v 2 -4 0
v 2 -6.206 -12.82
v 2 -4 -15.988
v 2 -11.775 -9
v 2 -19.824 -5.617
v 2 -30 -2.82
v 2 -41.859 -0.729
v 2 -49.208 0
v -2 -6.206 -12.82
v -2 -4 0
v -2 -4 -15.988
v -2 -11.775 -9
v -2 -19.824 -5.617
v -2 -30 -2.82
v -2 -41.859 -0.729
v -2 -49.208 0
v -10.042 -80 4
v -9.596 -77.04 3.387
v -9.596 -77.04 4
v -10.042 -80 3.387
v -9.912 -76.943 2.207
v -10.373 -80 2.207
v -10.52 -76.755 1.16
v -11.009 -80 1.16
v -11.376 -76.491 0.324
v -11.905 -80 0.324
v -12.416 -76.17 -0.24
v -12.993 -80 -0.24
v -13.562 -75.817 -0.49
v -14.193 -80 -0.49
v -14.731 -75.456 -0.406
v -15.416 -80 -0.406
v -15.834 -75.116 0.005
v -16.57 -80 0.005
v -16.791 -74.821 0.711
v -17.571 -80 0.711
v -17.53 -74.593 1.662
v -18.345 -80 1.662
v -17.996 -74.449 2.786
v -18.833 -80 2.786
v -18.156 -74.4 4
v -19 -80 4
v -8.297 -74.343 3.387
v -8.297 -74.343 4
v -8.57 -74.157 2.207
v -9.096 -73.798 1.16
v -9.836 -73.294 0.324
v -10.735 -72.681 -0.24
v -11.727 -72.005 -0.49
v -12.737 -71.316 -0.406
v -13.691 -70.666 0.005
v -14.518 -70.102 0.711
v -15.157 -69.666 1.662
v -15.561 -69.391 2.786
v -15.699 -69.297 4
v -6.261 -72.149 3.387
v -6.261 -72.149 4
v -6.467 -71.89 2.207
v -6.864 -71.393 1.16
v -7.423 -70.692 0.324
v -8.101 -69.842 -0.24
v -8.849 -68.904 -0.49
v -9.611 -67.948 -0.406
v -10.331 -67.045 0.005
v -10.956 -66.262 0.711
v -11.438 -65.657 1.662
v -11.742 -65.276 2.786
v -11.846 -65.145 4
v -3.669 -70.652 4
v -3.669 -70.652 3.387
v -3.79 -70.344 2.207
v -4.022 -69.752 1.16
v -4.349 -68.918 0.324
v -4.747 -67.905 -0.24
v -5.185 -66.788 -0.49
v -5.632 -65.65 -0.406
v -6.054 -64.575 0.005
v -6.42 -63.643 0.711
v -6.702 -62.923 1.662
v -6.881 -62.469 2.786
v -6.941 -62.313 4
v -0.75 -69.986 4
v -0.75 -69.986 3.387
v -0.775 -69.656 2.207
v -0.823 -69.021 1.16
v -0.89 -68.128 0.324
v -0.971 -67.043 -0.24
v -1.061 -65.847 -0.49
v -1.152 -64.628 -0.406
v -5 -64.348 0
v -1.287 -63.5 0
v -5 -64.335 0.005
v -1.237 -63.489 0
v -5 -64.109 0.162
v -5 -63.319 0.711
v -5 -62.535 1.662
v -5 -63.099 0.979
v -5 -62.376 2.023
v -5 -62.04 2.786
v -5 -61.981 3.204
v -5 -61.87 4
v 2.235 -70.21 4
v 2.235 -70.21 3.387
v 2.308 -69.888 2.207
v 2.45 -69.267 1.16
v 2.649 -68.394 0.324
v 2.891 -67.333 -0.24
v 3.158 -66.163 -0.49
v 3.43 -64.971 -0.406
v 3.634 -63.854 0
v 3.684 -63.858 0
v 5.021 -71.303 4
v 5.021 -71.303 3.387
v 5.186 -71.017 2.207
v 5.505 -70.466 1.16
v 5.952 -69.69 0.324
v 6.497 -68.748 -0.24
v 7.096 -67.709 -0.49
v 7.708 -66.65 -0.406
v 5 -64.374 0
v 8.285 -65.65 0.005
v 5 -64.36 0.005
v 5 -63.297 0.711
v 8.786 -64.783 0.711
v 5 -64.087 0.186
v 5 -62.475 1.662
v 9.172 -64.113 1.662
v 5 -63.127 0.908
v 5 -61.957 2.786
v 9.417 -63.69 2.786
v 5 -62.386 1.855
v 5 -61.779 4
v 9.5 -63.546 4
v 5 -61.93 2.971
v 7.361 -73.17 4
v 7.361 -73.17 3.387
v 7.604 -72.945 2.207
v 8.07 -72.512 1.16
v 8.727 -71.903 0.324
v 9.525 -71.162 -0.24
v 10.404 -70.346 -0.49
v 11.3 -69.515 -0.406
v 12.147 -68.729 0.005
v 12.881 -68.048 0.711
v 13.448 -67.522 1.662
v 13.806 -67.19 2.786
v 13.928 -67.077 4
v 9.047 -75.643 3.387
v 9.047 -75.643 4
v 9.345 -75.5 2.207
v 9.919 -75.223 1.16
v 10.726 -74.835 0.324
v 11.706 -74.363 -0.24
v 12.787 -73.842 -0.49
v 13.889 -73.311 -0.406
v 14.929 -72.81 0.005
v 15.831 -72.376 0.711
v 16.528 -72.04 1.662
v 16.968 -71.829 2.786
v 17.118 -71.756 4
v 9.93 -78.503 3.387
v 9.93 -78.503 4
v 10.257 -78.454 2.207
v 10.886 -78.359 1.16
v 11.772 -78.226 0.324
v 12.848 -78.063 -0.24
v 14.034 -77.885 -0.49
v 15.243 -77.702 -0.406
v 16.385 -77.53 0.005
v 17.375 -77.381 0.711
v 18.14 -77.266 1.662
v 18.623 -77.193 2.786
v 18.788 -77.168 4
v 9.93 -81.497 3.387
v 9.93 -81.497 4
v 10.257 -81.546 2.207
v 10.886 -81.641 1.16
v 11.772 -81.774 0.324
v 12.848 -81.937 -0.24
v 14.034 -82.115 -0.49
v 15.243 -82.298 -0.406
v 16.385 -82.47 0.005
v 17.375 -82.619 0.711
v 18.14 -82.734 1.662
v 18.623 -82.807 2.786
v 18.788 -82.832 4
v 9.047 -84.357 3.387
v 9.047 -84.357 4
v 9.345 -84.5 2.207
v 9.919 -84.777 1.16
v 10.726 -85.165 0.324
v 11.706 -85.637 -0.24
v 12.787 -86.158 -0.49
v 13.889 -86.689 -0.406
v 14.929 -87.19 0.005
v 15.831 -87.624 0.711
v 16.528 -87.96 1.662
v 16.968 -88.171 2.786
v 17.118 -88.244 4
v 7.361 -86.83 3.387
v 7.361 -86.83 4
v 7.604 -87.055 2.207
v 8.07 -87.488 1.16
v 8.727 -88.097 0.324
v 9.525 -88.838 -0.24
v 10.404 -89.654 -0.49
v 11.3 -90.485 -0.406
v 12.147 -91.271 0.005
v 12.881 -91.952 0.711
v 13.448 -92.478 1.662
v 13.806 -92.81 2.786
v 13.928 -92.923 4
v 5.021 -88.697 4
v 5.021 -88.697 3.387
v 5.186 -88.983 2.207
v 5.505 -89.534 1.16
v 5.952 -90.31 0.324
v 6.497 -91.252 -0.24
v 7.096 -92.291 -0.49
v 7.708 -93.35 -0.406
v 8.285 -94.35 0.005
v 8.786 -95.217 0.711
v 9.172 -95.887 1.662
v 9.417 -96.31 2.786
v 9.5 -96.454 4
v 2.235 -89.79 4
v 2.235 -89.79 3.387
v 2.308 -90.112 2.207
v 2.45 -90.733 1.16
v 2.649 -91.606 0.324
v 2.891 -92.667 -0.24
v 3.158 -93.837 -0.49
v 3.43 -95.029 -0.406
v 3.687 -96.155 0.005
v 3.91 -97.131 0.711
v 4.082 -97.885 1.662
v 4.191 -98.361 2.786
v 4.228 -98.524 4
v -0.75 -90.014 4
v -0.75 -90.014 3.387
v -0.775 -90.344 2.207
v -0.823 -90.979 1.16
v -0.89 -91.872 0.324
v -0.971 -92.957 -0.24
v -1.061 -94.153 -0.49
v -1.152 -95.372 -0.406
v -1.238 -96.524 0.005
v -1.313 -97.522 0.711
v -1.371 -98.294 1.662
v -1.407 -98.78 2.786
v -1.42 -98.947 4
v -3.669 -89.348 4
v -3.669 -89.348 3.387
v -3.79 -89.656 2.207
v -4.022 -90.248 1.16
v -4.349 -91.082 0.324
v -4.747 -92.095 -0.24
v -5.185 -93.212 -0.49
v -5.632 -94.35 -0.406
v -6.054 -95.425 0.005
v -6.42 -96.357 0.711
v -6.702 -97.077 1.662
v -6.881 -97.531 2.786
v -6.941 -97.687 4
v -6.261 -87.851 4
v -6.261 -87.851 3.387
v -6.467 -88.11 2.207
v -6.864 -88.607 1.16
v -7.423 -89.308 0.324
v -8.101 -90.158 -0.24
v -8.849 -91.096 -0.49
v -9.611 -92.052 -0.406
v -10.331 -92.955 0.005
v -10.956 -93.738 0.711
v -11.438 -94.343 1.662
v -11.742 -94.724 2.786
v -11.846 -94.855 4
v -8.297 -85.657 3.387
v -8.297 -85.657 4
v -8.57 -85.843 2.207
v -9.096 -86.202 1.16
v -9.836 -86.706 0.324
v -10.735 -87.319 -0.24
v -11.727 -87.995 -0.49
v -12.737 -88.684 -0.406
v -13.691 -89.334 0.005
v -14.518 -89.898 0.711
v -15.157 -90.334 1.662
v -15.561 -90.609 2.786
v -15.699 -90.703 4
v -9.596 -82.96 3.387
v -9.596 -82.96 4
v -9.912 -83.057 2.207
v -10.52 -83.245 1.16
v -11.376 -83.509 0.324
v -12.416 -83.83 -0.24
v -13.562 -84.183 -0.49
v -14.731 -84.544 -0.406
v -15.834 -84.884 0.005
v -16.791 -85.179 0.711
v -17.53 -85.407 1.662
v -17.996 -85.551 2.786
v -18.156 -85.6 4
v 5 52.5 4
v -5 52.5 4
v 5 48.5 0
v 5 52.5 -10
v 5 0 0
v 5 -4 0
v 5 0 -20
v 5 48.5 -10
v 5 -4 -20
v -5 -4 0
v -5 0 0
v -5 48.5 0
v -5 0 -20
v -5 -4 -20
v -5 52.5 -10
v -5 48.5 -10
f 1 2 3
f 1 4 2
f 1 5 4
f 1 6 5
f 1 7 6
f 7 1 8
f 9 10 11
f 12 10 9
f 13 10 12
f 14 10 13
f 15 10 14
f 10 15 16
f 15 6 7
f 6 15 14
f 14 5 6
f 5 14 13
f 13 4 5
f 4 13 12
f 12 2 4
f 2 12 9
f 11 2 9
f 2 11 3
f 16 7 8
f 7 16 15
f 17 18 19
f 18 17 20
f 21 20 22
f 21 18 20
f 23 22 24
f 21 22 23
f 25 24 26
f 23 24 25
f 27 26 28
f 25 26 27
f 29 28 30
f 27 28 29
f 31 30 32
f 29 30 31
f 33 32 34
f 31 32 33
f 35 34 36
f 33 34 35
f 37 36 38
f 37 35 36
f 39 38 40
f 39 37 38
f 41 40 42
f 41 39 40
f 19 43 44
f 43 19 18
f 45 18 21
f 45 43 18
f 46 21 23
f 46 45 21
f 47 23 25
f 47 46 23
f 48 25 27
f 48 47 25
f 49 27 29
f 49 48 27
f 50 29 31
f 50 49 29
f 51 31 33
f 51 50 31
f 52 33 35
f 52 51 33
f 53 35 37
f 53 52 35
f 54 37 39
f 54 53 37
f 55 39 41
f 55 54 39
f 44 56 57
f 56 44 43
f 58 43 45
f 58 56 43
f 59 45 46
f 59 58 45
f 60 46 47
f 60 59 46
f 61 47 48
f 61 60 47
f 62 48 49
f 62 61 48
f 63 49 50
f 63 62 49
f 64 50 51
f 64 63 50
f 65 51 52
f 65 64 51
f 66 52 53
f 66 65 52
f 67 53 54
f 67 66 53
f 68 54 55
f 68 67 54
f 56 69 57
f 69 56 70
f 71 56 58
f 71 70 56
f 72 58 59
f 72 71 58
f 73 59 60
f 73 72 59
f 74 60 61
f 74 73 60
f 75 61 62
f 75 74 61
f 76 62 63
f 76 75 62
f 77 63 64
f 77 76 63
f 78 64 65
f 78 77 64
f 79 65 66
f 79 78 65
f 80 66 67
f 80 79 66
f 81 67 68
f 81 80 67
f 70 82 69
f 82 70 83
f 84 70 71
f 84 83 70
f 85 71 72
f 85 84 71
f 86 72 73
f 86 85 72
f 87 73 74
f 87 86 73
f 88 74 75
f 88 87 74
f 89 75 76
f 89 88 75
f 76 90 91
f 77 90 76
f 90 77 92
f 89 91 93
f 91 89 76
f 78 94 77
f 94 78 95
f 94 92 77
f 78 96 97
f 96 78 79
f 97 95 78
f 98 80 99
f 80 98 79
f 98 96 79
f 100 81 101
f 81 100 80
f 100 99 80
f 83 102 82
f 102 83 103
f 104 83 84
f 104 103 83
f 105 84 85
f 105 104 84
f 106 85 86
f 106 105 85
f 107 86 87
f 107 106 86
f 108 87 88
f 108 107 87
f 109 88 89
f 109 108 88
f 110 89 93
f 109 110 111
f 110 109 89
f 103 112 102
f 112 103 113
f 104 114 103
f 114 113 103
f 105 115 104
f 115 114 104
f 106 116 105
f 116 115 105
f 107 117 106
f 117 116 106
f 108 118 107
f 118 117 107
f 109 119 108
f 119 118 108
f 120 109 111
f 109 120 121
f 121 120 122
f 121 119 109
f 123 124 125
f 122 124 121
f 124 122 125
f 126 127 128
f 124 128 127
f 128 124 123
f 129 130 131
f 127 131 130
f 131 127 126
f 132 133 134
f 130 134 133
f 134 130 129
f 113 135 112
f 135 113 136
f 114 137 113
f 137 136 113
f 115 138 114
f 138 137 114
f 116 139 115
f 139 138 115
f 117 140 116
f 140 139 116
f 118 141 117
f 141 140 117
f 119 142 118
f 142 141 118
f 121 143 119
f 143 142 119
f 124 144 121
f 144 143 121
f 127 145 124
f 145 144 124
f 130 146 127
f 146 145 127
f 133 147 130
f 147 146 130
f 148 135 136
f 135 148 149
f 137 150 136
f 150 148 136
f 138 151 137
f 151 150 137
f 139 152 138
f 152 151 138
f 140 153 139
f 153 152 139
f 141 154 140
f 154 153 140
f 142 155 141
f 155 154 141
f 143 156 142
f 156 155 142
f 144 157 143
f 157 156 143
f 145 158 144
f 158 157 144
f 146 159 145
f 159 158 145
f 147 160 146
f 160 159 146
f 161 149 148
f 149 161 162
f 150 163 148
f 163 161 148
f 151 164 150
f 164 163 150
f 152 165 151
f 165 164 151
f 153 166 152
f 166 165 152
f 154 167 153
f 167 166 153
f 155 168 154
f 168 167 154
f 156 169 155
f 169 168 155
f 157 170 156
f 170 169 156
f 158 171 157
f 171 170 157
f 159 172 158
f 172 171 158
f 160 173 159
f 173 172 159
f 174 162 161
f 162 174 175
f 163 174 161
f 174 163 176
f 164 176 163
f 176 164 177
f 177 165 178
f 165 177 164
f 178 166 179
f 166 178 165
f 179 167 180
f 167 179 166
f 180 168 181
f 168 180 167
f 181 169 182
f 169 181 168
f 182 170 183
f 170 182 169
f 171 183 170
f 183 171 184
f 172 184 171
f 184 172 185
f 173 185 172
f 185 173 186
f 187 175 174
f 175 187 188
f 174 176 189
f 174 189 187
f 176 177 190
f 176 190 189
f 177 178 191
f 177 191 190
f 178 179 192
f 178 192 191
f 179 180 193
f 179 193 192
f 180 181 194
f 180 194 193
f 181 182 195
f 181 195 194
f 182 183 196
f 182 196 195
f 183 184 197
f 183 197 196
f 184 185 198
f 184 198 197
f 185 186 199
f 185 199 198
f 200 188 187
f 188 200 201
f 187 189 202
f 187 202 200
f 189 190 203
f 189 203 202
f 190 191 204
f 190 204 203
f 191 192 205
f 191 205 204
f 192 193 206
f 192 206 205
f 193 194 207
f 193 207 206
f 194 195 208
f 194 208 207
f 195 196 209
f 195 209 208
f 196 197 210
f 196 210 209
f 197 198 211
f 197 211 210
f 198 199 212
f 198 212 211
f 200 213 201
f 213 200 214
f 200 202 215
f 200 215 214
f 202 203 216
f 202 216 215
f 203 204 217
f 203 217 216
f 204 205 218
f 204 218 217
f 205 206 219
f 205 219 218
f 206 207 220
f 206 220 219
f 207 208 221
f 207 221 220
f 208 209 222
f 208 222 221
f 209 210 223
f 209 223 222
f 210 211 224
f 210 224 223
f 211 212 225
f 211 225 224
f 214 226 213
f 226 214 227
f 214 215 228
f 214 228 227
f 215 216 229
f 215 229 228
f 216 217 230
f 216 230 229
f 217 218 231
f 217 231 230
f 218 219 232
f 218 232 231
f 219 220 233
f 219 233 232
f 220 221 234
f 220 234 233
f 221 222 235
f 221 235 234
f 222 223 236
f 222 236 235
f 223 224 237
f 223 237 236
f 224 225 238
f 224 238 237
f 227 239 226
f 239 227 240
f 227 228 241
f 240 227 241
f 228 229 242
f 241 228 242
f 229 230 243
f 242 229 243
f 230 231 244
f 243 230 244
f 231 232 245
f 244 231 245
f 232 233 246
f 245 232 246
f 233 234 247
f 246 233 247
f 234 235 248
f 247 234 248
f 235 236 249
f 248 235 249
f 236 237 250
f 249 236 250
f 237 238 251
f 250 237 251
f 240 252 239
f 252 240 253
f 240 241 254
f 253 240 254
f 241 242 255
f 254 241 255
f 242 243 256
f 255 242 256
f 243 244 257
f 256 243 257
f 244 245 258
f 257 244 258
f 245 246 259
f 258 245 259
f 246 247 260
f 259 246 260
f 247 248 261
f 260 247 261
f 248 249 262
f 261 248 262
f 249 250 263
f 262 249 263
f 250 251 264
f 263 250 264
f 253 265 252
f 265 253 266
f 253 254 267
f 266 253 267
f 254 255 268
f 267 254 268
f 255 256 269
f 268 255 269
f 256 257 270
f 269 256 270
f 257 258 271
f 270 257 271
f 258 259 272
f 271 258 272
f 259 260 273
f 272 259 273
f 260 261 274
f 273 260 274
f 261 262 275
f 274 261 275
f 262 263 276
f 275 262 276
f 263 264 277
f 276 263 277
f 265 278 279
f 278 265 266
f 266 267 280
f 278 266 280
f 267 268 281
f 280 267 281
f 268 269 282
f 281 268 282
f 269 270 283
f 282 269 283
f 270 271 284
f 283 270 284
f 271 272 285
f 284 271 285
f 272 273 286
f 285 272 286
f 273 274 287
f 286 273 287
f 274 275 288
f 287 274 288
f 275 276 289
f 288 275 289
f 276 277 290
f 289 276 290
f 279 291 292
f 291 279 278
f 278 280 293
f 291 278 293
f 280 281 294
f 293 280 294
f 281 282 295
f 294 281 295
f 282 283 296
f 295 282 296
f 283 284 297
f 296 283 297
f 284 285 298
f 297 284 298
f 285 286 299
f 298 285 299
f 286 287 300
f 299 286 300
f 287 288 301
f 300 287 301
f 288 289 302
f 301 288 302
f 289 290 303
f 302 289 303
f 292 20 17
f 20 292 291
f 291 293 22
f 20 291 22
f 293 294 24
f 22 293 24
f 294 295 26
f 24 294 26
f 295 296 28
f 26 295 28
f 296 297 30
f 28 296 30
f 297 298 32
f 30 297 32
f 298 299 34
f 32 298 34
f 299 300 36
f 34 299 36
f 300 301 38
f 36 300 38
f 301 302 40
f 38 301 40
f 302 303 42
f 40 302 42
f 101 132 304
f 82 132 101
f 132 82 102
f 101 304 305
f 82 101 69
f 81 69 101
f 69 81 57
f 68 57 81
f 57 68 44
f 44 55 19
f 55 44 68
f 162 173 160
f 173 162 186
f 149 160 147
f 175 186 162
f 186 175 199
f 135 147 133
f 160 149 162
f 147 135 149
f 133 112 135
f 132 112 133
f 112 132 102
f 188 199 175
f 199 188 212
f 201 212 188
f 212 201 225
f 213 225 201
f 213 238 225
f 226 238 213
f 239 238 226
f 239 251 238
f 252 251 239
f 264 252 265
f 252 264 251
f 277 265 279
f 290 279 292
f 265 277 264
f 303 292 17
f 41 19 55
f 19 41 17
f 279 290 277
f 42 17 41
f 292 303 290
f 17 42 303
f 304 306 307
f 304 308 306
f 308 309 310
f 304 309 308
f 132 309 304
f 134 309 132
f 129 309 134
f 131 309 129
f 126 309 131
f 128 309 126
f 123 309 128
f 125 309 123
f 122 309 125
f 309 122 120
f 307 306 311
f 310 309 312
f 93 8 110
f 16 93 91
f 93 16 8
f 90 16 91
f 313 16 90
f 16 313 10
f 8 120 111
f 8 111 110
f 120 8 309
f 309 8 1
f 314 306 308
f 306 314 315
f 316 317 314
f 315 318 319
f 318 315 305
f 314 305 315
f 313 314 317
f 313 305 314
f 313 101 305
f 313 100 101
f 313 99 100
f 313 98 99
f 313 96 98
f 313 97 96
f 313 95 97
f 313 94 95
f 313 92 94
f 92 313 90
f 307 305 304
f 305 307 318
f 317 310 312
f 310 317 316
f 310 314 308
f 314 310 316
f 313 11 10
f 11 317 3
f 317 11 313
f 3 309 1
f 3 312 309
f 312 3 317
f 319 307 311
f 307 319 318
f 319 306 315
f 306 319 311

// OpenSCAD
// Panel thickness
t=6.35;

// Jitter
j=1;

hole_diameter=20;
ring_diameter=9;
ring_offset=80;

printer_top_width=48.5;

// sample 3mm filament
%color([1, 0, 0]) translate([0, -80, 0]) cylinder(r=1.5, h=100, $fn=30, center=true);

// top of printer
%translate([-100, 0, -t])
union()
{
	color([150/255, 121/255, 32/255]) translate([0, t, 0]) cube([200, printer_top_width-t, t]);
	color([181/255, 148/255, 51/255]) translate([0, 0, -49.6+t]) cube([200, t, 49.5]);
}


// Top Support
translate([-5, -ring_offset+(hole_diameter/2)+(ring_diameter/2), 0]) cube([10, printer_top_width+ring_offset-((hole_diameter/2)+(ring_diameter/2))+4, 4]);

// Front Support
translate([-5, -4, -20]) cube([10, 4, 20+j]);

// Front Arch
arch_length=ring_offset-((hole_diameter/2)+(ring_diameter/2));
arch_height=20;

translate([-2, -ring_offset+((hole_diameter/2)+(ring_diameter/2))+j-4, -20+j]) 
difference()
{
	cube([4, arch_length, arch_height]);
	scale([1, arch_length/arch_height, 1]) translate([-j, 0, 0]) rotate([0, 90, 0]) cylinder(r=arch_height, h=j+4+j);
}


// Back Support
translate([-5,  printer_top_width, -10]) cube([10, 4, 10+j]);


// Guide
translate([0, -ring_offset, 4]) SemiGuide();

//%translate([0, -hole_diameter-10, ring_diameter/2+j])
//rotate([180, 0, 0])
//SemiGuide();


//translate([hole_diameter*2+ring_diameter, -hole_diameter-10, ring_diameter/2+j])
//SemiGuide();


module SemiGuide()
{
	intersection()
	{
		rotate_extrude(convexity = 10, $fn=21)
		translate([hole_diameter/2+ring_diameter/2, 0, 0])
		circle(r = ring_diameter/2, $fn=23);
		
		translate([0,0,-ring_diameter/4-j]) 
		cube([hole_diameter+2*ring_diameter+j+j, hole_diameter+2*ring_diameter+j+j, ring_diameter/2+j+j], center=true);
	}
}
